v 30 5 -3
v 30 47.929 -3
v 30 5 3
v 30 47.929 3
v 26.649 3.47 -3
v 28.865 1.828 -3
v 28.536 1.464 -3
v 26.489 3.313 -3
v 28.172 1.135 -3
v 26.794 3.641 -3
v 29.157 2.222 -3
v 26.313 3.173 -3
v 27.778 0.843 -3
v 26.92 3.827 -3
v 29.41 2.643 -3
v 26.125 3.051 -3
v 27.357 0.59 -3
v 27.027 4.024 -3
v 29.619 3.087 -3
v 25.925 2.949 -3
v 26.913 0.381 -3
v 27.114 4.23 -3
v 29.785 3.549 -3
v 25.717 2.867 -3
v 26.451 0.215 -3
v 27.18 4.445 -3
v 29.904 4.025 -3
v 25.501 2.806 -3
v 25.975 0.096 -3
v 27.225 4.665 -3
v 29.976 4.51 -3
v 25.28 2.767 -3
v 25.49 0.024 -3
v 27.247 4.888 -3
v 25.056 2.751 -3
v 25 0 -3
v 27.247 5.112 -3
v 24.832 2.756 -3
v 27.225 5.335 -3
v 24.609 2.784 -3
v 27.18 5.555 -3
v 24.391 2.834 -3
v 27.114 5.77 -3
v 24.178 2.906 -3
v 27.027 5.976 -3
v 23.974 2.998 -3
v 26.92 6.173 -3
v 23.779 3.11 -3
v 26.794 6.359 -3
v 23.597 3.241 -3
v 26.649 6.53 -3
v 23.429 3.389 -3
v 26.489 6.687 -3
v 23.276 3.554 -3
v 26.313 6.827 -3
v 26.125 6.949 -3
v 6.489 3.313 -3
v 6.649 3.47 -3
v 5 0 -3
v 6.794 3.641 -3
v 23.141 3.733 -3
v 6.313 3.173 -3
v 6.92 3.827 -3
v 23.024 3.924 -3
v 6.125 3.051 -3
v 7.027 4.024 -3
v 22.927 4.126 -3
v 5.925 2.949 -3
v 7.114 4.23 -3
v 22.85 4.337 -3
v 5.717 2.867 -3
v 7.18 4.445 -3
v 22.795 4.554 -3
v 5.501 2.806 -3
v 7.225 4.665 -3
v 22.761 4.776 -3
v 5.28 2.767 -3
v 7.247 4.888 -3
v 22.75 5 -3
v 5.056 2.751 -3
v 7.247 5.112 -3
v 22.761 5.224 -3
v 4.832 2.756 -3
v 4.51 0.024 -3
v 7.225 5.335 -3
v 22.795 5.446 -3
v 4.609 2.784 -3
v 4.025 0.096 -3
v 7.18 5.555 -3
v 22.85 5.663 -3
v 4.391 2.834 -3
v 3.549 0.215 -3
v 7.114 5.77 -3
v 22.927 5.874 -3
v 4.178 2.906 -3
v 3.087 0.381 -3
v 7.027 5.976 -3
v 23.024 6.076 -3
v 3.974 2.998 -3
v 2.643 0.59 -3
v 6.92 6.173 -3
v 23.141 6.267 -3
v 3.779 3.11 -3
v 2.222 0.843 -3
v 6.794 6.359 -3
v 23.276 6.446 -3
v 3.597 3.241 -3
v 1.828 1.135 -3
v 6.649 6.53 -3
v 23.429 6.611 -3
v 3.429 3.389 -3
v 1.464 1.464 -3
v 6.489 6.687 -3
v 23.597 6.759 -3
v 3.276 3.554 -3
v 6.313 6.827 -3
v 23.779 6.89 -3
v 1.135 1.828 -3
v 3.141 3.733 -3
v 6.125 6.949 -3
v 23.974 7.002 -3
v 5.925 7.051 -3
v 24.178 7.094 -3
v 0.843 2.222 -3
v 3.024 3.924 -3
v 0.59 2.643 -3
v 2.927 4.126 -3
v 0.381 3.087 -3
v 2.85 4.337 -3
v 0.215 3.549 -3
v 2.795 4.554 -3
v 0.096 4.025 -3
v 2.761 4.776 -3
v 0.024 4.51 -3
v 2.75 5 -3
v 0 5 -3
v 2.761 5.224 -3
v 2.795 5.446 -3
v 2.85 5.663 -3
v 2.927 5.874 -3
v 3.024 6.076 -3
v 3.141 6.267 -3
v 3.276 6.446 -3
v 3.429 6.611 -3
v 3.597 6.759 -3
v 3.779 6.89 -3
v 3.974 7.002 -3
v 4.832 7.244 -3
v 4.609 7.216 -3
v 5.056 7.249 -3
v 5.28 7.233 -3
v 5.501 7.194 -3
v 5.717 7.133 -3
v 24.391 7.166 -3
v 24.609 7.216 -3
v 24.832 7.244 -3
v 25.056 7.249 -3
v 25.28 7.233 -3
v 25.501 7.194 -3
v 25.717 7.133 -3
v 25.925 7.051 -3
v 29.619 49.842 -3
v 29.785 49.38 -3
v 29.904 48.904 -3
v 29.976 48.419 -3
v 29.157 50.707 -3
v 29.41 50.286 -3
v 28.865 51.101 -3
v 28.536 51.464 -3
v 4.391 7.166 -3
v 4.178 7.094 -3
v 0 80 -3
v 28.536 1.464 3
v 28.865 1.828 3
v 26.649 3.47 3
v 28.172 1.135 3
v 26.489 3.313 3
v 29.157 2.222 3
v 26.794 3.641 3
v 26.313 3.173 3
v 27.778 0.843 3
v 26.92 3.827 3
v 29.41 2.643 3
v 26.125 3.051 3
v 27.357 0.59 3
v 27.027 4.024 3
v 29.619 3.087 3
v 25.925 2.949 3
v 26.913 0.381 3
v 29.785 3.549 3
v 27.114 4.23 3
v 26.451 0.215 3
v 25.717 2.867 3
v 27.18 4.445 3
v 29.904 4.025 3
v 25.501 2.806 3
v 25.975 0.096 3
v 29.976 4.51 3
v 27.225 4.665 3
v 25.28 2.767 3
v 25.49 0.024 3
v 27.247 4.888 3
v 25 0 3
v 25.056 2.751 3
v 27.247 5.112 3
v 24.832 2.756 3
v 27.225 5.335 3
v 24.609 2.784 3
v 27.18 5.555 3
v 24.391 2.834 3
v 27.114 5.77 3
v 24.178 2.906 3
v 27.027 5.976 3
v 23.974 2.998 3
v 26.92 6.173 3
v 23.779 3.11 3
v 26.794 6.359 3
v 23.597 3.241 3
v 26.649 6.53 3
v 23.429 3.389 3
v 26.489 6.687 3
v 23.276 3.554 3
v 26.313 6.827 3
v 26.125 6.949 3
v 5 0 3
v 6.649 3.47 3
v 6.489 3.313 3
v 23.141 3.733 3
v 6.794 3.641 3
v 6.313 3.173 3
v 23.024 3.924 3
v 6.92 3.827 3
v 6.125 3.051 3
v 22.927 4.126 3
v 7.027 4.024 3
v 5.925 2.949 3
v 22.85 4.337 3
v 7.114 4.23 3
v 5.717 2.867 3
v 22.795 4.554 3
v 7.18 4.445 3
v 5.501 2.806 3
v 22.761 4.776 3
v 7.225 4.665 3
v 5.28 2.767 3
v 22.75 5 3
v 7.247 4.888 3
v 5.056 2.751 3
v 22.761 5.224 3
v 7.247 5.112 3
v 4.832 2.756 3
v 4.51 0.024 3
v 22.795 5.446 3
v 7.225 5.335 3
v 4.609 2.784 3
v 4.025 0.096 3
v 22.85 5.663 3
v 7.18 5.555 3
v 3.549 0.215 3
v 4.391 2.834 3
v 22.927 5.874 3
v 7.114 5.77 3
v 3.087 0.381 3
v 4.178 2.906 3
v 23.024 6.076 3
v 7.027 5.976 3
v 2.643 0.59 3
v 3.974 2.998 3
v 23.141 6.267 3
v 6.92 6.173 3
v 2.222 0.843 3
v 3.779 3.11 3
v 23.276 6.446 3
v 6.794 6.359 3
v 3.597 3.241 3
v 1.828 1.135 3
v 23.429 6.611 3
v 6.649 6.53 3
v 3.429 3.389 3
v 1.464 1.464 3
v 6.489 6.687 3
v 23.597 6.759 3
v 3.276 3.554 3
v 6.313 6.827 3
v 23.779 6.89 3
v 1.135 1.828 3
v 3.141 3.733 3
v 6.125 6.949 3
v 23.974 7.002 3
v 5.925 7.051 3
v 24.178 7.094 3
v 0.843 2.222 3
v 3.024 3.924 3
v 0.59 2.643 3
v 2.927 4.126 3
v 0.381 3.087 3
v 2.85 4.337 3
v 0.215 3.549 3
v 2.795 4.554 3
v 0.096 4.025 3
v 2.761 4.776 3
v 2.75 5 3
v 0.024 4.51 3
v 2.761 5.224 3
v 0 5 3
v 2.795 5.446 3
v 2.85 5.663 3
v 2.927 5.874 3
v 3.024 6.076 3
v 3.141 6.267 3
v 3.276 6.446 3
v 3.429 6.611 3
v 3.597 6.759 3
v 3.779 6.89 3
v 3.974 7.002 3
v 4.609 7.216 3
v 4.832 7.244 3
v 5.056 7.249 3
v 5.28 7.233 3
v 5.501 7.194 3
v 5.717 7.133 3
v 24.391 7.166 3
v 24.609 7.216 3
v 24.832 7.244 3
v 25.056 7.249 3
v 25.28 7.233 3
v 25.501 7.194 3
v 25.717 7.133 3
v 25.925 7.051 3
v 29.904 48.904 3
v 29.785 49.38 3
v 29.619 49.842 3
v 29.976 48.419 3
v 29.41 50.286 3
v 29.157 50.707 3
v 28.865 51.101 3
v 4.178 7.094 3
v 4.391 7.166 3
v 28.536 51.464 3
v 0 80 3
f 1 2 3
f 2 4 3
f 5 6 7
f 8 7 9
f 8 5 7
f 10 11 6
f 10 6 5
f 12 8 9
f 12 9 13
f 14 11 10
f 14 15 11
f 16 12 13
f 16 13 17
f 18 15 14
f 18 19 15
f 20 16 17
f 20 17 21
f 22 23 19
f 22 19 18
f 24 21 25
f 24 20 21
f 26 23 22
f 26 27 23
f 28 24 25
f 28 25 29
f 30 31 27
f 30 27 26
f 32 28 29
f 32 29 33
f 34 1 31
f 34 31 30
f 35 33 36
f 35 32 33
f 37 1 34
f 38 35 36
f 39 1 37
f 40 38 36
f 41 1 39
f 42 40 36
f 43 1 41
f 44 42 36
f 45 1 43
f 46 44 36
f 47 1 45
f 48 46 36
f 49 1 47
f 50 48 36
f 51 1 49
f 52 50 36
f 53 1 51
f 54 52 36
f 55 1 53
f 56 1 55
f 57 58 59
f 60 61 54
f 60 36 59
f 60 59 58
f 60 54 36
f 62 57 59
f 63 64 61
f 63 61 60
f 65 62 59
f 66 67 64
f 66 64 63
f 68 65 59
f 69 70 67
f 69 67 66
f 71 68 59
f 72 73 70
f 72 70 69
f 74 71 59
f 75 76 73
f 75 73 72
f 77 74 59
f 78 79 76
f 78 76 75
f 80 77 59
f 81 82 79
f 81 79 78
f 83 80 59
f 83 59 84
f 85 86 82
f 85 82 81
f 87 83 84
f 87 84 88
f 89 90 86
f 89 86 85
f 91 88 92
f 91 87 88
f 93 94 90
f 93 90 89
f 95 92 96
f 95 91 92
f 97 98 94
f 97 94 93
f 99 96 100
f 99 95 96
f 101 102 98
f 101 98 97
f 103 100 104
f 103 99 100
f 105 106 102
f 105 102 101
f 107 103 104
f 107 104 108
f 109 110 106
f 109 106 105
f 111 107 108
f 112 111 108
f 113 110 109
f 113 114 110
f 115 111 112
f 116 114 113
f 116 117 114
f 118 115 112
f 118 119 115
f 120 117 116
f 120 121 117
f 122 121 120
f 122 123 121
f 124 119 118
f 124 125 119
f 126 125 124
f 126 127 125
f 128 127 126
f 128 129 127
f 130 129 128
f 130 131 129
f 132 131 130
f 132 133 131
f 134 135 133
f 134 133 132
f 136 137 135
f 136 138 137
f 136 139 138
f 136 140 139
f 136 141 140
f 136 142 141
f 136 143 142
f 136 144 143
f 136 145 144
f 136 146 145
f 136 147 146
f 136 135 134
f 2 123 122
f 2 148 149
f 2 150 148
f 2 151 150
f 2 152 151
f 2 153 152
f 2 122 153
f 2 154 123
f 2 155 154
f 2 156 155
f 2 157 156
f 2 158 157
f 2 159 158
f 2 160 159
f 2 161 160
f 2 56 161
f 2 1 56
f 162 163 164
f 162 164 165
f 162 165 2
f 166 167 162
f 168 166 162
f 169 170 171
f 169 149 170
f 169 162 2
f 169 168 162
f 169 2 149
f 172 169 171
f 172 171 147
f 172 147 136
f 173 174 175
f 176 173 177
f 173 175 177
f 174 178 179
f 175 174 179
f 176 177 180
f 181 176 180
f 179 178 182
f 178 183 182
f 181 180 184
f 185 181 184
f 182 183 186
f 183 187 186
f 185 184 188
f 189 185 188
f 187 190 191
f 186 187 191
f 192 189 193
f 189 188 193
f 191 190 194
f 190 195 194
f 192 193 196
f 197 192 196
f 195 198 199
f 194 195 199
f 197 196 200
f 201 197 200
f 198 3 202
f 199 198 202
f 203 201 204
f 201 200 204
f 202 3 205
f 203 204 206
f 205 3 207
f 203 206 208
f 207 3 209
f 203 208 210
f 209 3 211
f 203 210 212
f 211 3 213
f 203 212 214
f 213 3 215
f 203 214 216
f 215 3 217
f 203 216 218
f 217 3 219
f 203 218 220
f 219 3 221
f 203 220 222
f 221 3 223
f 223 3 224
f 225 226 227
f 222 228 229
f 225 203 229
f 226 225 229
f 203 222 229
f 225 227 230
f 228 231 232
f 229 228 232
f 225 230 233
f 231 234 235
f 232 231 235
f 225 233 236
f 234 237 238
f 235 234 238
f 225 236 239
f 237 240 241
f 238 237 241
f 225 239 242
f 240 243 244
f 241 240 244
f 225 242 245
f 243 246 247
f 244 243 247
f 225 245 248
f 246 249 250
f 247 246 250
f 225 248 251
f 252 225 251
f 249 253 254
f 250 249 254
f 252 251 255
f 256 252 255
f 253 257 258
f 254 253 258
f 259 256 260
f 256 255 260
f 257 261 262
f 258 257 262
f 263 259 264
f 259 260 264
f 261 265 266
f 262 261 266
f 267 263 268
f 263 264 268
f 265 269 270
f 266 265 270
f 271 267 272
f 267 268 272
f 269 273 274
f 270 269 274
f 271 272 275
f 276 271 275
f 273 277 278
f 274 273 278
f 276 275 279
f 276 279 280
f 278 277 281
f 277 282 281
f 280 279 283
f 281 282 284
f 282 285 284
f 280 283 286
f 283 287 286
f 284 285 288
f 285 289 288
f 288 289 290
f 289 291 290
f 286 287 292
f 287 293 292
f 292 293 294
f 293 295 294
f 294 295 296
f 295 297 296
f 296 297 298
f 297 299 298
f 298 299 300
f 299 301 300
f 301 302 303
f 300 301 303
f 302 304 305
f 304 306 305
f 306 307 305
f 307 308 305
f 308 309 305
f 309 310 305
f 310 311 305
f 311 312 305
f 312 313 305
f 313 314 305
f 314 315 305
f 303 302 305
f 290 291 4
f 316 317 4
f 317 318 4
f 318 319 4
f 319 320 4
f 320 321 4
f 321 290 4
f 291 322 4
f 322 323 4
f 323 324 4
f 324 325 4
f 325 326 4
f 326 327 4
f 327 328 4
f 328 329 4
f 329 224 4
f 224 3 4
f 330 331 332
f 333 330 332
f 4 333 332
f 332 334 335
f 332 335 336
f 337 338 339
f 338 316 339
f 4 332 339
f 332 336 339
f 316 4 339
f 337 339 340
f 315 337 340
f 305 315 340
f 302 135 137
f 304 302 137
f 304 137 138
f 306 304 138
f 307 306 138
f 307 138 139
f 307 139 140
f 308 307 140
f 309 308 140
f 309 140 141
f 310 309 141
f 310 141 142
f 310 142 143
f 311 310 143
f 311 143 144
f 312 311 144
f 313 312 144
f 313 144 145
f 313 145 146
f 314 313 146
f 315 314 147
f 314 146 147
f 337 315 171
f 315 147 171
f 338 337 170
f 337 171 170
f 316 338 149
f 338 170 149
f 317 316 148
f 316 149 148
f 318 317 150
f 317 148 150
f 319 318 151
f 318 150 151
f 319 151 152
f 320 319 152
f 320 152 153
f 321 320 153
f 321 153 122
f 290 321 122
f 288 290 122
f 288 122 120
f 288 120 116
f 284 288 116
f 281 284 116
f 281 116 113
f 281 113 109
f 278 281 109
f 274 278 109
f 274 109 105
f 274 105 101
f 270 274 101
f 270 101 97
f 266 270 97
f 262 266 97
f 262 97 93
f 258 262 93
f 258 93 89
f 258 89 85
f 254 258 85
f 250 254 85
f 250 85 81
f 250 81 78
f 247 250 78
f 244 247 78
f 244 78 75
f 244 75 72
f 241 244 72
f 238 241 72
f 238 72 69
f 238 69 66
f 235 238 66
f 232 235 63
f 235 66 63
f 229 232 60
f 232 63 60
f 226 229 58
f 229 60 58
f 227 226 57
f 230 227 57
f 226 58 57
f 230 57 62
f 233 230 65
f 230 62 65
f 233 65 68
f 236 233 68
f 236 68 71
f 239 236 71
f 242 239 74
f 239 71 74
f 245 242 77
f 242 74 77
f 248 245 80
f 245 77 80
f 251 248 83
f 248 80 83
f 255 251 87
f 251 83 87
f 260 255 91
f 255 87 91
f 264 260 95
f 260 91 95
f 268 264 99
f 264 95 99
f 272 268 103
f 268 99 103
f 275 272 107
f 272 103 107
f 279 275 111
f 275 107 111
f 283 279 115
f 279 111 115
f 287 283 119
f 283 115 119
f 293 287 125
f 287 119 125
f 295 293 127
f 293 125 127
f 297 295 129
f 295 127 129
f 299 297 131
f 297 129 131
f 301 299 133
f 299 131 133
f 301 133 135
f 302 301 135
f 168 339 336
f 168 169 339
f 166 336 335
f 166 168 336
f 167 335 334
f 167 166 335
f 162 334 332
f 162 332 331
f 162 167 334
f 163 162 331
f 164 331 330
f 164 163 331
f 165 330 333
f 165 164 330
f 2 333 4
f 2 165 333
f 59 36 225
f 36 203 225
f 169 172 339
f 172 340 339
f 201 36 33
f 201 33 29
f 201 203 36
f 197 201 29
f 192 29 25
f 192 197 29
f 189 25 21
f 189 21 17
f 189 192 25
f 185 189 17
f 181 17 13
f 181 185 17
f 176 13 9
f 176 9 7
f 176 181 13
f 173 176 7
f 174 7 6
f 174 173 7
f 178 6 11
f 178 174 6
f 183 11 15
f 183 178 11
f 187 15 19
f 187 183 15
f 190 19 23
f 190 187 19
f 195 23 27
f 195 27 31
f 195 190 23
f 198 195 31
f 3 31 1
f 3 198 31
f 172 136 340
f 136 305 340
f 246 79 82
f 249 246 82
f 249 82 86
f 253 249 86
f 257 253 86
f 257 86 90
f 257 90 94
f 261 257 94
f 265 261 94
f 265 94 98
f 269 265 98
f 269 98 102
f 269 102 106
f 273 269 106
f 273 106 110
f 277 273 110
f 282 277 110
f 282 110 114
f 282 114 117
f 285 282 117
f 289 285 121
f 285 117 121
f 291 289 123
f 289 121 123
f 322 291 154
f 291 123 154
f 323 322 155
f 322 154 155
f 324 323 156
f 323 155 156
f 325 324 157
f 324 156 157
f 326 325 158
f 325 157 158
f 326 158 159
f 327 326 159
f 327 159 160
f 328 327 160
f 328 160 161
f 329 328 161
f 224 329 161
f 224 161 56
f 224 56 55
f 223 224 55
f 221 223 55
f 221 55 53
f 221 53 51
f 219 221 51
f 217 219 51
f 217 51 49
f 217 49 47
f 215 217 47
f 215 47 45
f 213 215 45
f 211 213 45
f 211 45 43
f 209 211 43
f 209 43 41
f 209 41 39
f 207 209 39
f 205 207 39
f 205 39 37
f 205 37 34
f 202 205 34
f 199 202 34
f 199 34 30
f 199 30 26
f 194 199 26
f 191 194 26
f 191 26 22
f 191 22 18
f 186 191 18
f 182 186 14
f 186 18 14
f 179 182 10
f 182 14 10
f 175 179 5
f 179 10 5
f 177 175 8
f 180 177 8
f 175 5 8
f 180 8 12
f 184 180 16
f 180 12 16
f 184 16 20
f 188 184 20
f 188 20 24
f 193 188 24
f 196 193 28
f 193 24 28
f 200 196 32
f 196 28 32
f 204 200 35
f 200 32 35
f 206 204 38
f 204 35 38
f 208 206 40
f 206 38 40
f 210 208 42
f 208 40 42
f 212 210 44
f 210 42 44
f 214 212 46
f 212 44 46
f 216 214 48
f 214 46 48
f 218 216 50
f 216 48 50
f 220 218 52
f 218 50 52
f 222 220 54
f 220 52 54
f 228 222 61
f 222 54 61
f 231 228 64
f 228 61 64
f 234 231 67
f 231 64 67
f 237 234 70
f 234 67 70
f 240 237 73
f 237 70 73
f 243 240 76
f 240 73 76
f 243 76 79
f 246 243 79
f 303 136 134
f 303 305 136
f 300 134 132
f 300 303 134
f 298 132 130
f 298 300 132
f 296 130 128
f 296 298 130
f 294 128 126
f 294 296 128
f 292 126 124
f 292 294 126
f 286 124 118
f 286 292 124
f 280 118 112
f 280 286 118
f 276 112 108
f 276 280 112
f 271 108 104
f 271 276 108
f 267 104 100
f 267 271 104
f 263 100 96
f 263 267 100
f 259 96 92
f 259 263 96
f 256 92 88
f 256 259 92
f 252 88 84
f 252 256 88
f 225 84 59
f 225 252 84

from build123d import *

# Parameters (mm, degrees)
SALIENTE_EXTRUIR1_DEPTH      = 3
TALADRO_DE_MARGEN_PARA_M41_D = 4.5
REDONDEO1_R                  = 5


with BuildPart() as part:
    # Croquis1 → Saliente-Extruir1 (new, symmetric)
    with BuildSketch(Plane.XY):
        Polygon((0, 0), (0, 80), (30, 50), (30, 0), align=None)
    extrude(amount=SALIENTE_EXTRUIR1_DEPTH, both=True)

    # Taladro de margen para M41 (through all)
    with Locations(Plane.XY.offset(3)):
        with Locations((5, 5), (25, 5)):
            Hole(TALADRO_DE_MARGEN_PARA_M41_D / 2)

    # Redondeo1
    redondeo1_edges = [part.edges().sort_by_distance(p)[0] for p in [
        (0, 0, 0),
        (30, 50, 0),
        (30, 0, 0),
    ]]
    fillet(redondeo1_edges, radius=REDONDEO1_R)


solid = part.part
